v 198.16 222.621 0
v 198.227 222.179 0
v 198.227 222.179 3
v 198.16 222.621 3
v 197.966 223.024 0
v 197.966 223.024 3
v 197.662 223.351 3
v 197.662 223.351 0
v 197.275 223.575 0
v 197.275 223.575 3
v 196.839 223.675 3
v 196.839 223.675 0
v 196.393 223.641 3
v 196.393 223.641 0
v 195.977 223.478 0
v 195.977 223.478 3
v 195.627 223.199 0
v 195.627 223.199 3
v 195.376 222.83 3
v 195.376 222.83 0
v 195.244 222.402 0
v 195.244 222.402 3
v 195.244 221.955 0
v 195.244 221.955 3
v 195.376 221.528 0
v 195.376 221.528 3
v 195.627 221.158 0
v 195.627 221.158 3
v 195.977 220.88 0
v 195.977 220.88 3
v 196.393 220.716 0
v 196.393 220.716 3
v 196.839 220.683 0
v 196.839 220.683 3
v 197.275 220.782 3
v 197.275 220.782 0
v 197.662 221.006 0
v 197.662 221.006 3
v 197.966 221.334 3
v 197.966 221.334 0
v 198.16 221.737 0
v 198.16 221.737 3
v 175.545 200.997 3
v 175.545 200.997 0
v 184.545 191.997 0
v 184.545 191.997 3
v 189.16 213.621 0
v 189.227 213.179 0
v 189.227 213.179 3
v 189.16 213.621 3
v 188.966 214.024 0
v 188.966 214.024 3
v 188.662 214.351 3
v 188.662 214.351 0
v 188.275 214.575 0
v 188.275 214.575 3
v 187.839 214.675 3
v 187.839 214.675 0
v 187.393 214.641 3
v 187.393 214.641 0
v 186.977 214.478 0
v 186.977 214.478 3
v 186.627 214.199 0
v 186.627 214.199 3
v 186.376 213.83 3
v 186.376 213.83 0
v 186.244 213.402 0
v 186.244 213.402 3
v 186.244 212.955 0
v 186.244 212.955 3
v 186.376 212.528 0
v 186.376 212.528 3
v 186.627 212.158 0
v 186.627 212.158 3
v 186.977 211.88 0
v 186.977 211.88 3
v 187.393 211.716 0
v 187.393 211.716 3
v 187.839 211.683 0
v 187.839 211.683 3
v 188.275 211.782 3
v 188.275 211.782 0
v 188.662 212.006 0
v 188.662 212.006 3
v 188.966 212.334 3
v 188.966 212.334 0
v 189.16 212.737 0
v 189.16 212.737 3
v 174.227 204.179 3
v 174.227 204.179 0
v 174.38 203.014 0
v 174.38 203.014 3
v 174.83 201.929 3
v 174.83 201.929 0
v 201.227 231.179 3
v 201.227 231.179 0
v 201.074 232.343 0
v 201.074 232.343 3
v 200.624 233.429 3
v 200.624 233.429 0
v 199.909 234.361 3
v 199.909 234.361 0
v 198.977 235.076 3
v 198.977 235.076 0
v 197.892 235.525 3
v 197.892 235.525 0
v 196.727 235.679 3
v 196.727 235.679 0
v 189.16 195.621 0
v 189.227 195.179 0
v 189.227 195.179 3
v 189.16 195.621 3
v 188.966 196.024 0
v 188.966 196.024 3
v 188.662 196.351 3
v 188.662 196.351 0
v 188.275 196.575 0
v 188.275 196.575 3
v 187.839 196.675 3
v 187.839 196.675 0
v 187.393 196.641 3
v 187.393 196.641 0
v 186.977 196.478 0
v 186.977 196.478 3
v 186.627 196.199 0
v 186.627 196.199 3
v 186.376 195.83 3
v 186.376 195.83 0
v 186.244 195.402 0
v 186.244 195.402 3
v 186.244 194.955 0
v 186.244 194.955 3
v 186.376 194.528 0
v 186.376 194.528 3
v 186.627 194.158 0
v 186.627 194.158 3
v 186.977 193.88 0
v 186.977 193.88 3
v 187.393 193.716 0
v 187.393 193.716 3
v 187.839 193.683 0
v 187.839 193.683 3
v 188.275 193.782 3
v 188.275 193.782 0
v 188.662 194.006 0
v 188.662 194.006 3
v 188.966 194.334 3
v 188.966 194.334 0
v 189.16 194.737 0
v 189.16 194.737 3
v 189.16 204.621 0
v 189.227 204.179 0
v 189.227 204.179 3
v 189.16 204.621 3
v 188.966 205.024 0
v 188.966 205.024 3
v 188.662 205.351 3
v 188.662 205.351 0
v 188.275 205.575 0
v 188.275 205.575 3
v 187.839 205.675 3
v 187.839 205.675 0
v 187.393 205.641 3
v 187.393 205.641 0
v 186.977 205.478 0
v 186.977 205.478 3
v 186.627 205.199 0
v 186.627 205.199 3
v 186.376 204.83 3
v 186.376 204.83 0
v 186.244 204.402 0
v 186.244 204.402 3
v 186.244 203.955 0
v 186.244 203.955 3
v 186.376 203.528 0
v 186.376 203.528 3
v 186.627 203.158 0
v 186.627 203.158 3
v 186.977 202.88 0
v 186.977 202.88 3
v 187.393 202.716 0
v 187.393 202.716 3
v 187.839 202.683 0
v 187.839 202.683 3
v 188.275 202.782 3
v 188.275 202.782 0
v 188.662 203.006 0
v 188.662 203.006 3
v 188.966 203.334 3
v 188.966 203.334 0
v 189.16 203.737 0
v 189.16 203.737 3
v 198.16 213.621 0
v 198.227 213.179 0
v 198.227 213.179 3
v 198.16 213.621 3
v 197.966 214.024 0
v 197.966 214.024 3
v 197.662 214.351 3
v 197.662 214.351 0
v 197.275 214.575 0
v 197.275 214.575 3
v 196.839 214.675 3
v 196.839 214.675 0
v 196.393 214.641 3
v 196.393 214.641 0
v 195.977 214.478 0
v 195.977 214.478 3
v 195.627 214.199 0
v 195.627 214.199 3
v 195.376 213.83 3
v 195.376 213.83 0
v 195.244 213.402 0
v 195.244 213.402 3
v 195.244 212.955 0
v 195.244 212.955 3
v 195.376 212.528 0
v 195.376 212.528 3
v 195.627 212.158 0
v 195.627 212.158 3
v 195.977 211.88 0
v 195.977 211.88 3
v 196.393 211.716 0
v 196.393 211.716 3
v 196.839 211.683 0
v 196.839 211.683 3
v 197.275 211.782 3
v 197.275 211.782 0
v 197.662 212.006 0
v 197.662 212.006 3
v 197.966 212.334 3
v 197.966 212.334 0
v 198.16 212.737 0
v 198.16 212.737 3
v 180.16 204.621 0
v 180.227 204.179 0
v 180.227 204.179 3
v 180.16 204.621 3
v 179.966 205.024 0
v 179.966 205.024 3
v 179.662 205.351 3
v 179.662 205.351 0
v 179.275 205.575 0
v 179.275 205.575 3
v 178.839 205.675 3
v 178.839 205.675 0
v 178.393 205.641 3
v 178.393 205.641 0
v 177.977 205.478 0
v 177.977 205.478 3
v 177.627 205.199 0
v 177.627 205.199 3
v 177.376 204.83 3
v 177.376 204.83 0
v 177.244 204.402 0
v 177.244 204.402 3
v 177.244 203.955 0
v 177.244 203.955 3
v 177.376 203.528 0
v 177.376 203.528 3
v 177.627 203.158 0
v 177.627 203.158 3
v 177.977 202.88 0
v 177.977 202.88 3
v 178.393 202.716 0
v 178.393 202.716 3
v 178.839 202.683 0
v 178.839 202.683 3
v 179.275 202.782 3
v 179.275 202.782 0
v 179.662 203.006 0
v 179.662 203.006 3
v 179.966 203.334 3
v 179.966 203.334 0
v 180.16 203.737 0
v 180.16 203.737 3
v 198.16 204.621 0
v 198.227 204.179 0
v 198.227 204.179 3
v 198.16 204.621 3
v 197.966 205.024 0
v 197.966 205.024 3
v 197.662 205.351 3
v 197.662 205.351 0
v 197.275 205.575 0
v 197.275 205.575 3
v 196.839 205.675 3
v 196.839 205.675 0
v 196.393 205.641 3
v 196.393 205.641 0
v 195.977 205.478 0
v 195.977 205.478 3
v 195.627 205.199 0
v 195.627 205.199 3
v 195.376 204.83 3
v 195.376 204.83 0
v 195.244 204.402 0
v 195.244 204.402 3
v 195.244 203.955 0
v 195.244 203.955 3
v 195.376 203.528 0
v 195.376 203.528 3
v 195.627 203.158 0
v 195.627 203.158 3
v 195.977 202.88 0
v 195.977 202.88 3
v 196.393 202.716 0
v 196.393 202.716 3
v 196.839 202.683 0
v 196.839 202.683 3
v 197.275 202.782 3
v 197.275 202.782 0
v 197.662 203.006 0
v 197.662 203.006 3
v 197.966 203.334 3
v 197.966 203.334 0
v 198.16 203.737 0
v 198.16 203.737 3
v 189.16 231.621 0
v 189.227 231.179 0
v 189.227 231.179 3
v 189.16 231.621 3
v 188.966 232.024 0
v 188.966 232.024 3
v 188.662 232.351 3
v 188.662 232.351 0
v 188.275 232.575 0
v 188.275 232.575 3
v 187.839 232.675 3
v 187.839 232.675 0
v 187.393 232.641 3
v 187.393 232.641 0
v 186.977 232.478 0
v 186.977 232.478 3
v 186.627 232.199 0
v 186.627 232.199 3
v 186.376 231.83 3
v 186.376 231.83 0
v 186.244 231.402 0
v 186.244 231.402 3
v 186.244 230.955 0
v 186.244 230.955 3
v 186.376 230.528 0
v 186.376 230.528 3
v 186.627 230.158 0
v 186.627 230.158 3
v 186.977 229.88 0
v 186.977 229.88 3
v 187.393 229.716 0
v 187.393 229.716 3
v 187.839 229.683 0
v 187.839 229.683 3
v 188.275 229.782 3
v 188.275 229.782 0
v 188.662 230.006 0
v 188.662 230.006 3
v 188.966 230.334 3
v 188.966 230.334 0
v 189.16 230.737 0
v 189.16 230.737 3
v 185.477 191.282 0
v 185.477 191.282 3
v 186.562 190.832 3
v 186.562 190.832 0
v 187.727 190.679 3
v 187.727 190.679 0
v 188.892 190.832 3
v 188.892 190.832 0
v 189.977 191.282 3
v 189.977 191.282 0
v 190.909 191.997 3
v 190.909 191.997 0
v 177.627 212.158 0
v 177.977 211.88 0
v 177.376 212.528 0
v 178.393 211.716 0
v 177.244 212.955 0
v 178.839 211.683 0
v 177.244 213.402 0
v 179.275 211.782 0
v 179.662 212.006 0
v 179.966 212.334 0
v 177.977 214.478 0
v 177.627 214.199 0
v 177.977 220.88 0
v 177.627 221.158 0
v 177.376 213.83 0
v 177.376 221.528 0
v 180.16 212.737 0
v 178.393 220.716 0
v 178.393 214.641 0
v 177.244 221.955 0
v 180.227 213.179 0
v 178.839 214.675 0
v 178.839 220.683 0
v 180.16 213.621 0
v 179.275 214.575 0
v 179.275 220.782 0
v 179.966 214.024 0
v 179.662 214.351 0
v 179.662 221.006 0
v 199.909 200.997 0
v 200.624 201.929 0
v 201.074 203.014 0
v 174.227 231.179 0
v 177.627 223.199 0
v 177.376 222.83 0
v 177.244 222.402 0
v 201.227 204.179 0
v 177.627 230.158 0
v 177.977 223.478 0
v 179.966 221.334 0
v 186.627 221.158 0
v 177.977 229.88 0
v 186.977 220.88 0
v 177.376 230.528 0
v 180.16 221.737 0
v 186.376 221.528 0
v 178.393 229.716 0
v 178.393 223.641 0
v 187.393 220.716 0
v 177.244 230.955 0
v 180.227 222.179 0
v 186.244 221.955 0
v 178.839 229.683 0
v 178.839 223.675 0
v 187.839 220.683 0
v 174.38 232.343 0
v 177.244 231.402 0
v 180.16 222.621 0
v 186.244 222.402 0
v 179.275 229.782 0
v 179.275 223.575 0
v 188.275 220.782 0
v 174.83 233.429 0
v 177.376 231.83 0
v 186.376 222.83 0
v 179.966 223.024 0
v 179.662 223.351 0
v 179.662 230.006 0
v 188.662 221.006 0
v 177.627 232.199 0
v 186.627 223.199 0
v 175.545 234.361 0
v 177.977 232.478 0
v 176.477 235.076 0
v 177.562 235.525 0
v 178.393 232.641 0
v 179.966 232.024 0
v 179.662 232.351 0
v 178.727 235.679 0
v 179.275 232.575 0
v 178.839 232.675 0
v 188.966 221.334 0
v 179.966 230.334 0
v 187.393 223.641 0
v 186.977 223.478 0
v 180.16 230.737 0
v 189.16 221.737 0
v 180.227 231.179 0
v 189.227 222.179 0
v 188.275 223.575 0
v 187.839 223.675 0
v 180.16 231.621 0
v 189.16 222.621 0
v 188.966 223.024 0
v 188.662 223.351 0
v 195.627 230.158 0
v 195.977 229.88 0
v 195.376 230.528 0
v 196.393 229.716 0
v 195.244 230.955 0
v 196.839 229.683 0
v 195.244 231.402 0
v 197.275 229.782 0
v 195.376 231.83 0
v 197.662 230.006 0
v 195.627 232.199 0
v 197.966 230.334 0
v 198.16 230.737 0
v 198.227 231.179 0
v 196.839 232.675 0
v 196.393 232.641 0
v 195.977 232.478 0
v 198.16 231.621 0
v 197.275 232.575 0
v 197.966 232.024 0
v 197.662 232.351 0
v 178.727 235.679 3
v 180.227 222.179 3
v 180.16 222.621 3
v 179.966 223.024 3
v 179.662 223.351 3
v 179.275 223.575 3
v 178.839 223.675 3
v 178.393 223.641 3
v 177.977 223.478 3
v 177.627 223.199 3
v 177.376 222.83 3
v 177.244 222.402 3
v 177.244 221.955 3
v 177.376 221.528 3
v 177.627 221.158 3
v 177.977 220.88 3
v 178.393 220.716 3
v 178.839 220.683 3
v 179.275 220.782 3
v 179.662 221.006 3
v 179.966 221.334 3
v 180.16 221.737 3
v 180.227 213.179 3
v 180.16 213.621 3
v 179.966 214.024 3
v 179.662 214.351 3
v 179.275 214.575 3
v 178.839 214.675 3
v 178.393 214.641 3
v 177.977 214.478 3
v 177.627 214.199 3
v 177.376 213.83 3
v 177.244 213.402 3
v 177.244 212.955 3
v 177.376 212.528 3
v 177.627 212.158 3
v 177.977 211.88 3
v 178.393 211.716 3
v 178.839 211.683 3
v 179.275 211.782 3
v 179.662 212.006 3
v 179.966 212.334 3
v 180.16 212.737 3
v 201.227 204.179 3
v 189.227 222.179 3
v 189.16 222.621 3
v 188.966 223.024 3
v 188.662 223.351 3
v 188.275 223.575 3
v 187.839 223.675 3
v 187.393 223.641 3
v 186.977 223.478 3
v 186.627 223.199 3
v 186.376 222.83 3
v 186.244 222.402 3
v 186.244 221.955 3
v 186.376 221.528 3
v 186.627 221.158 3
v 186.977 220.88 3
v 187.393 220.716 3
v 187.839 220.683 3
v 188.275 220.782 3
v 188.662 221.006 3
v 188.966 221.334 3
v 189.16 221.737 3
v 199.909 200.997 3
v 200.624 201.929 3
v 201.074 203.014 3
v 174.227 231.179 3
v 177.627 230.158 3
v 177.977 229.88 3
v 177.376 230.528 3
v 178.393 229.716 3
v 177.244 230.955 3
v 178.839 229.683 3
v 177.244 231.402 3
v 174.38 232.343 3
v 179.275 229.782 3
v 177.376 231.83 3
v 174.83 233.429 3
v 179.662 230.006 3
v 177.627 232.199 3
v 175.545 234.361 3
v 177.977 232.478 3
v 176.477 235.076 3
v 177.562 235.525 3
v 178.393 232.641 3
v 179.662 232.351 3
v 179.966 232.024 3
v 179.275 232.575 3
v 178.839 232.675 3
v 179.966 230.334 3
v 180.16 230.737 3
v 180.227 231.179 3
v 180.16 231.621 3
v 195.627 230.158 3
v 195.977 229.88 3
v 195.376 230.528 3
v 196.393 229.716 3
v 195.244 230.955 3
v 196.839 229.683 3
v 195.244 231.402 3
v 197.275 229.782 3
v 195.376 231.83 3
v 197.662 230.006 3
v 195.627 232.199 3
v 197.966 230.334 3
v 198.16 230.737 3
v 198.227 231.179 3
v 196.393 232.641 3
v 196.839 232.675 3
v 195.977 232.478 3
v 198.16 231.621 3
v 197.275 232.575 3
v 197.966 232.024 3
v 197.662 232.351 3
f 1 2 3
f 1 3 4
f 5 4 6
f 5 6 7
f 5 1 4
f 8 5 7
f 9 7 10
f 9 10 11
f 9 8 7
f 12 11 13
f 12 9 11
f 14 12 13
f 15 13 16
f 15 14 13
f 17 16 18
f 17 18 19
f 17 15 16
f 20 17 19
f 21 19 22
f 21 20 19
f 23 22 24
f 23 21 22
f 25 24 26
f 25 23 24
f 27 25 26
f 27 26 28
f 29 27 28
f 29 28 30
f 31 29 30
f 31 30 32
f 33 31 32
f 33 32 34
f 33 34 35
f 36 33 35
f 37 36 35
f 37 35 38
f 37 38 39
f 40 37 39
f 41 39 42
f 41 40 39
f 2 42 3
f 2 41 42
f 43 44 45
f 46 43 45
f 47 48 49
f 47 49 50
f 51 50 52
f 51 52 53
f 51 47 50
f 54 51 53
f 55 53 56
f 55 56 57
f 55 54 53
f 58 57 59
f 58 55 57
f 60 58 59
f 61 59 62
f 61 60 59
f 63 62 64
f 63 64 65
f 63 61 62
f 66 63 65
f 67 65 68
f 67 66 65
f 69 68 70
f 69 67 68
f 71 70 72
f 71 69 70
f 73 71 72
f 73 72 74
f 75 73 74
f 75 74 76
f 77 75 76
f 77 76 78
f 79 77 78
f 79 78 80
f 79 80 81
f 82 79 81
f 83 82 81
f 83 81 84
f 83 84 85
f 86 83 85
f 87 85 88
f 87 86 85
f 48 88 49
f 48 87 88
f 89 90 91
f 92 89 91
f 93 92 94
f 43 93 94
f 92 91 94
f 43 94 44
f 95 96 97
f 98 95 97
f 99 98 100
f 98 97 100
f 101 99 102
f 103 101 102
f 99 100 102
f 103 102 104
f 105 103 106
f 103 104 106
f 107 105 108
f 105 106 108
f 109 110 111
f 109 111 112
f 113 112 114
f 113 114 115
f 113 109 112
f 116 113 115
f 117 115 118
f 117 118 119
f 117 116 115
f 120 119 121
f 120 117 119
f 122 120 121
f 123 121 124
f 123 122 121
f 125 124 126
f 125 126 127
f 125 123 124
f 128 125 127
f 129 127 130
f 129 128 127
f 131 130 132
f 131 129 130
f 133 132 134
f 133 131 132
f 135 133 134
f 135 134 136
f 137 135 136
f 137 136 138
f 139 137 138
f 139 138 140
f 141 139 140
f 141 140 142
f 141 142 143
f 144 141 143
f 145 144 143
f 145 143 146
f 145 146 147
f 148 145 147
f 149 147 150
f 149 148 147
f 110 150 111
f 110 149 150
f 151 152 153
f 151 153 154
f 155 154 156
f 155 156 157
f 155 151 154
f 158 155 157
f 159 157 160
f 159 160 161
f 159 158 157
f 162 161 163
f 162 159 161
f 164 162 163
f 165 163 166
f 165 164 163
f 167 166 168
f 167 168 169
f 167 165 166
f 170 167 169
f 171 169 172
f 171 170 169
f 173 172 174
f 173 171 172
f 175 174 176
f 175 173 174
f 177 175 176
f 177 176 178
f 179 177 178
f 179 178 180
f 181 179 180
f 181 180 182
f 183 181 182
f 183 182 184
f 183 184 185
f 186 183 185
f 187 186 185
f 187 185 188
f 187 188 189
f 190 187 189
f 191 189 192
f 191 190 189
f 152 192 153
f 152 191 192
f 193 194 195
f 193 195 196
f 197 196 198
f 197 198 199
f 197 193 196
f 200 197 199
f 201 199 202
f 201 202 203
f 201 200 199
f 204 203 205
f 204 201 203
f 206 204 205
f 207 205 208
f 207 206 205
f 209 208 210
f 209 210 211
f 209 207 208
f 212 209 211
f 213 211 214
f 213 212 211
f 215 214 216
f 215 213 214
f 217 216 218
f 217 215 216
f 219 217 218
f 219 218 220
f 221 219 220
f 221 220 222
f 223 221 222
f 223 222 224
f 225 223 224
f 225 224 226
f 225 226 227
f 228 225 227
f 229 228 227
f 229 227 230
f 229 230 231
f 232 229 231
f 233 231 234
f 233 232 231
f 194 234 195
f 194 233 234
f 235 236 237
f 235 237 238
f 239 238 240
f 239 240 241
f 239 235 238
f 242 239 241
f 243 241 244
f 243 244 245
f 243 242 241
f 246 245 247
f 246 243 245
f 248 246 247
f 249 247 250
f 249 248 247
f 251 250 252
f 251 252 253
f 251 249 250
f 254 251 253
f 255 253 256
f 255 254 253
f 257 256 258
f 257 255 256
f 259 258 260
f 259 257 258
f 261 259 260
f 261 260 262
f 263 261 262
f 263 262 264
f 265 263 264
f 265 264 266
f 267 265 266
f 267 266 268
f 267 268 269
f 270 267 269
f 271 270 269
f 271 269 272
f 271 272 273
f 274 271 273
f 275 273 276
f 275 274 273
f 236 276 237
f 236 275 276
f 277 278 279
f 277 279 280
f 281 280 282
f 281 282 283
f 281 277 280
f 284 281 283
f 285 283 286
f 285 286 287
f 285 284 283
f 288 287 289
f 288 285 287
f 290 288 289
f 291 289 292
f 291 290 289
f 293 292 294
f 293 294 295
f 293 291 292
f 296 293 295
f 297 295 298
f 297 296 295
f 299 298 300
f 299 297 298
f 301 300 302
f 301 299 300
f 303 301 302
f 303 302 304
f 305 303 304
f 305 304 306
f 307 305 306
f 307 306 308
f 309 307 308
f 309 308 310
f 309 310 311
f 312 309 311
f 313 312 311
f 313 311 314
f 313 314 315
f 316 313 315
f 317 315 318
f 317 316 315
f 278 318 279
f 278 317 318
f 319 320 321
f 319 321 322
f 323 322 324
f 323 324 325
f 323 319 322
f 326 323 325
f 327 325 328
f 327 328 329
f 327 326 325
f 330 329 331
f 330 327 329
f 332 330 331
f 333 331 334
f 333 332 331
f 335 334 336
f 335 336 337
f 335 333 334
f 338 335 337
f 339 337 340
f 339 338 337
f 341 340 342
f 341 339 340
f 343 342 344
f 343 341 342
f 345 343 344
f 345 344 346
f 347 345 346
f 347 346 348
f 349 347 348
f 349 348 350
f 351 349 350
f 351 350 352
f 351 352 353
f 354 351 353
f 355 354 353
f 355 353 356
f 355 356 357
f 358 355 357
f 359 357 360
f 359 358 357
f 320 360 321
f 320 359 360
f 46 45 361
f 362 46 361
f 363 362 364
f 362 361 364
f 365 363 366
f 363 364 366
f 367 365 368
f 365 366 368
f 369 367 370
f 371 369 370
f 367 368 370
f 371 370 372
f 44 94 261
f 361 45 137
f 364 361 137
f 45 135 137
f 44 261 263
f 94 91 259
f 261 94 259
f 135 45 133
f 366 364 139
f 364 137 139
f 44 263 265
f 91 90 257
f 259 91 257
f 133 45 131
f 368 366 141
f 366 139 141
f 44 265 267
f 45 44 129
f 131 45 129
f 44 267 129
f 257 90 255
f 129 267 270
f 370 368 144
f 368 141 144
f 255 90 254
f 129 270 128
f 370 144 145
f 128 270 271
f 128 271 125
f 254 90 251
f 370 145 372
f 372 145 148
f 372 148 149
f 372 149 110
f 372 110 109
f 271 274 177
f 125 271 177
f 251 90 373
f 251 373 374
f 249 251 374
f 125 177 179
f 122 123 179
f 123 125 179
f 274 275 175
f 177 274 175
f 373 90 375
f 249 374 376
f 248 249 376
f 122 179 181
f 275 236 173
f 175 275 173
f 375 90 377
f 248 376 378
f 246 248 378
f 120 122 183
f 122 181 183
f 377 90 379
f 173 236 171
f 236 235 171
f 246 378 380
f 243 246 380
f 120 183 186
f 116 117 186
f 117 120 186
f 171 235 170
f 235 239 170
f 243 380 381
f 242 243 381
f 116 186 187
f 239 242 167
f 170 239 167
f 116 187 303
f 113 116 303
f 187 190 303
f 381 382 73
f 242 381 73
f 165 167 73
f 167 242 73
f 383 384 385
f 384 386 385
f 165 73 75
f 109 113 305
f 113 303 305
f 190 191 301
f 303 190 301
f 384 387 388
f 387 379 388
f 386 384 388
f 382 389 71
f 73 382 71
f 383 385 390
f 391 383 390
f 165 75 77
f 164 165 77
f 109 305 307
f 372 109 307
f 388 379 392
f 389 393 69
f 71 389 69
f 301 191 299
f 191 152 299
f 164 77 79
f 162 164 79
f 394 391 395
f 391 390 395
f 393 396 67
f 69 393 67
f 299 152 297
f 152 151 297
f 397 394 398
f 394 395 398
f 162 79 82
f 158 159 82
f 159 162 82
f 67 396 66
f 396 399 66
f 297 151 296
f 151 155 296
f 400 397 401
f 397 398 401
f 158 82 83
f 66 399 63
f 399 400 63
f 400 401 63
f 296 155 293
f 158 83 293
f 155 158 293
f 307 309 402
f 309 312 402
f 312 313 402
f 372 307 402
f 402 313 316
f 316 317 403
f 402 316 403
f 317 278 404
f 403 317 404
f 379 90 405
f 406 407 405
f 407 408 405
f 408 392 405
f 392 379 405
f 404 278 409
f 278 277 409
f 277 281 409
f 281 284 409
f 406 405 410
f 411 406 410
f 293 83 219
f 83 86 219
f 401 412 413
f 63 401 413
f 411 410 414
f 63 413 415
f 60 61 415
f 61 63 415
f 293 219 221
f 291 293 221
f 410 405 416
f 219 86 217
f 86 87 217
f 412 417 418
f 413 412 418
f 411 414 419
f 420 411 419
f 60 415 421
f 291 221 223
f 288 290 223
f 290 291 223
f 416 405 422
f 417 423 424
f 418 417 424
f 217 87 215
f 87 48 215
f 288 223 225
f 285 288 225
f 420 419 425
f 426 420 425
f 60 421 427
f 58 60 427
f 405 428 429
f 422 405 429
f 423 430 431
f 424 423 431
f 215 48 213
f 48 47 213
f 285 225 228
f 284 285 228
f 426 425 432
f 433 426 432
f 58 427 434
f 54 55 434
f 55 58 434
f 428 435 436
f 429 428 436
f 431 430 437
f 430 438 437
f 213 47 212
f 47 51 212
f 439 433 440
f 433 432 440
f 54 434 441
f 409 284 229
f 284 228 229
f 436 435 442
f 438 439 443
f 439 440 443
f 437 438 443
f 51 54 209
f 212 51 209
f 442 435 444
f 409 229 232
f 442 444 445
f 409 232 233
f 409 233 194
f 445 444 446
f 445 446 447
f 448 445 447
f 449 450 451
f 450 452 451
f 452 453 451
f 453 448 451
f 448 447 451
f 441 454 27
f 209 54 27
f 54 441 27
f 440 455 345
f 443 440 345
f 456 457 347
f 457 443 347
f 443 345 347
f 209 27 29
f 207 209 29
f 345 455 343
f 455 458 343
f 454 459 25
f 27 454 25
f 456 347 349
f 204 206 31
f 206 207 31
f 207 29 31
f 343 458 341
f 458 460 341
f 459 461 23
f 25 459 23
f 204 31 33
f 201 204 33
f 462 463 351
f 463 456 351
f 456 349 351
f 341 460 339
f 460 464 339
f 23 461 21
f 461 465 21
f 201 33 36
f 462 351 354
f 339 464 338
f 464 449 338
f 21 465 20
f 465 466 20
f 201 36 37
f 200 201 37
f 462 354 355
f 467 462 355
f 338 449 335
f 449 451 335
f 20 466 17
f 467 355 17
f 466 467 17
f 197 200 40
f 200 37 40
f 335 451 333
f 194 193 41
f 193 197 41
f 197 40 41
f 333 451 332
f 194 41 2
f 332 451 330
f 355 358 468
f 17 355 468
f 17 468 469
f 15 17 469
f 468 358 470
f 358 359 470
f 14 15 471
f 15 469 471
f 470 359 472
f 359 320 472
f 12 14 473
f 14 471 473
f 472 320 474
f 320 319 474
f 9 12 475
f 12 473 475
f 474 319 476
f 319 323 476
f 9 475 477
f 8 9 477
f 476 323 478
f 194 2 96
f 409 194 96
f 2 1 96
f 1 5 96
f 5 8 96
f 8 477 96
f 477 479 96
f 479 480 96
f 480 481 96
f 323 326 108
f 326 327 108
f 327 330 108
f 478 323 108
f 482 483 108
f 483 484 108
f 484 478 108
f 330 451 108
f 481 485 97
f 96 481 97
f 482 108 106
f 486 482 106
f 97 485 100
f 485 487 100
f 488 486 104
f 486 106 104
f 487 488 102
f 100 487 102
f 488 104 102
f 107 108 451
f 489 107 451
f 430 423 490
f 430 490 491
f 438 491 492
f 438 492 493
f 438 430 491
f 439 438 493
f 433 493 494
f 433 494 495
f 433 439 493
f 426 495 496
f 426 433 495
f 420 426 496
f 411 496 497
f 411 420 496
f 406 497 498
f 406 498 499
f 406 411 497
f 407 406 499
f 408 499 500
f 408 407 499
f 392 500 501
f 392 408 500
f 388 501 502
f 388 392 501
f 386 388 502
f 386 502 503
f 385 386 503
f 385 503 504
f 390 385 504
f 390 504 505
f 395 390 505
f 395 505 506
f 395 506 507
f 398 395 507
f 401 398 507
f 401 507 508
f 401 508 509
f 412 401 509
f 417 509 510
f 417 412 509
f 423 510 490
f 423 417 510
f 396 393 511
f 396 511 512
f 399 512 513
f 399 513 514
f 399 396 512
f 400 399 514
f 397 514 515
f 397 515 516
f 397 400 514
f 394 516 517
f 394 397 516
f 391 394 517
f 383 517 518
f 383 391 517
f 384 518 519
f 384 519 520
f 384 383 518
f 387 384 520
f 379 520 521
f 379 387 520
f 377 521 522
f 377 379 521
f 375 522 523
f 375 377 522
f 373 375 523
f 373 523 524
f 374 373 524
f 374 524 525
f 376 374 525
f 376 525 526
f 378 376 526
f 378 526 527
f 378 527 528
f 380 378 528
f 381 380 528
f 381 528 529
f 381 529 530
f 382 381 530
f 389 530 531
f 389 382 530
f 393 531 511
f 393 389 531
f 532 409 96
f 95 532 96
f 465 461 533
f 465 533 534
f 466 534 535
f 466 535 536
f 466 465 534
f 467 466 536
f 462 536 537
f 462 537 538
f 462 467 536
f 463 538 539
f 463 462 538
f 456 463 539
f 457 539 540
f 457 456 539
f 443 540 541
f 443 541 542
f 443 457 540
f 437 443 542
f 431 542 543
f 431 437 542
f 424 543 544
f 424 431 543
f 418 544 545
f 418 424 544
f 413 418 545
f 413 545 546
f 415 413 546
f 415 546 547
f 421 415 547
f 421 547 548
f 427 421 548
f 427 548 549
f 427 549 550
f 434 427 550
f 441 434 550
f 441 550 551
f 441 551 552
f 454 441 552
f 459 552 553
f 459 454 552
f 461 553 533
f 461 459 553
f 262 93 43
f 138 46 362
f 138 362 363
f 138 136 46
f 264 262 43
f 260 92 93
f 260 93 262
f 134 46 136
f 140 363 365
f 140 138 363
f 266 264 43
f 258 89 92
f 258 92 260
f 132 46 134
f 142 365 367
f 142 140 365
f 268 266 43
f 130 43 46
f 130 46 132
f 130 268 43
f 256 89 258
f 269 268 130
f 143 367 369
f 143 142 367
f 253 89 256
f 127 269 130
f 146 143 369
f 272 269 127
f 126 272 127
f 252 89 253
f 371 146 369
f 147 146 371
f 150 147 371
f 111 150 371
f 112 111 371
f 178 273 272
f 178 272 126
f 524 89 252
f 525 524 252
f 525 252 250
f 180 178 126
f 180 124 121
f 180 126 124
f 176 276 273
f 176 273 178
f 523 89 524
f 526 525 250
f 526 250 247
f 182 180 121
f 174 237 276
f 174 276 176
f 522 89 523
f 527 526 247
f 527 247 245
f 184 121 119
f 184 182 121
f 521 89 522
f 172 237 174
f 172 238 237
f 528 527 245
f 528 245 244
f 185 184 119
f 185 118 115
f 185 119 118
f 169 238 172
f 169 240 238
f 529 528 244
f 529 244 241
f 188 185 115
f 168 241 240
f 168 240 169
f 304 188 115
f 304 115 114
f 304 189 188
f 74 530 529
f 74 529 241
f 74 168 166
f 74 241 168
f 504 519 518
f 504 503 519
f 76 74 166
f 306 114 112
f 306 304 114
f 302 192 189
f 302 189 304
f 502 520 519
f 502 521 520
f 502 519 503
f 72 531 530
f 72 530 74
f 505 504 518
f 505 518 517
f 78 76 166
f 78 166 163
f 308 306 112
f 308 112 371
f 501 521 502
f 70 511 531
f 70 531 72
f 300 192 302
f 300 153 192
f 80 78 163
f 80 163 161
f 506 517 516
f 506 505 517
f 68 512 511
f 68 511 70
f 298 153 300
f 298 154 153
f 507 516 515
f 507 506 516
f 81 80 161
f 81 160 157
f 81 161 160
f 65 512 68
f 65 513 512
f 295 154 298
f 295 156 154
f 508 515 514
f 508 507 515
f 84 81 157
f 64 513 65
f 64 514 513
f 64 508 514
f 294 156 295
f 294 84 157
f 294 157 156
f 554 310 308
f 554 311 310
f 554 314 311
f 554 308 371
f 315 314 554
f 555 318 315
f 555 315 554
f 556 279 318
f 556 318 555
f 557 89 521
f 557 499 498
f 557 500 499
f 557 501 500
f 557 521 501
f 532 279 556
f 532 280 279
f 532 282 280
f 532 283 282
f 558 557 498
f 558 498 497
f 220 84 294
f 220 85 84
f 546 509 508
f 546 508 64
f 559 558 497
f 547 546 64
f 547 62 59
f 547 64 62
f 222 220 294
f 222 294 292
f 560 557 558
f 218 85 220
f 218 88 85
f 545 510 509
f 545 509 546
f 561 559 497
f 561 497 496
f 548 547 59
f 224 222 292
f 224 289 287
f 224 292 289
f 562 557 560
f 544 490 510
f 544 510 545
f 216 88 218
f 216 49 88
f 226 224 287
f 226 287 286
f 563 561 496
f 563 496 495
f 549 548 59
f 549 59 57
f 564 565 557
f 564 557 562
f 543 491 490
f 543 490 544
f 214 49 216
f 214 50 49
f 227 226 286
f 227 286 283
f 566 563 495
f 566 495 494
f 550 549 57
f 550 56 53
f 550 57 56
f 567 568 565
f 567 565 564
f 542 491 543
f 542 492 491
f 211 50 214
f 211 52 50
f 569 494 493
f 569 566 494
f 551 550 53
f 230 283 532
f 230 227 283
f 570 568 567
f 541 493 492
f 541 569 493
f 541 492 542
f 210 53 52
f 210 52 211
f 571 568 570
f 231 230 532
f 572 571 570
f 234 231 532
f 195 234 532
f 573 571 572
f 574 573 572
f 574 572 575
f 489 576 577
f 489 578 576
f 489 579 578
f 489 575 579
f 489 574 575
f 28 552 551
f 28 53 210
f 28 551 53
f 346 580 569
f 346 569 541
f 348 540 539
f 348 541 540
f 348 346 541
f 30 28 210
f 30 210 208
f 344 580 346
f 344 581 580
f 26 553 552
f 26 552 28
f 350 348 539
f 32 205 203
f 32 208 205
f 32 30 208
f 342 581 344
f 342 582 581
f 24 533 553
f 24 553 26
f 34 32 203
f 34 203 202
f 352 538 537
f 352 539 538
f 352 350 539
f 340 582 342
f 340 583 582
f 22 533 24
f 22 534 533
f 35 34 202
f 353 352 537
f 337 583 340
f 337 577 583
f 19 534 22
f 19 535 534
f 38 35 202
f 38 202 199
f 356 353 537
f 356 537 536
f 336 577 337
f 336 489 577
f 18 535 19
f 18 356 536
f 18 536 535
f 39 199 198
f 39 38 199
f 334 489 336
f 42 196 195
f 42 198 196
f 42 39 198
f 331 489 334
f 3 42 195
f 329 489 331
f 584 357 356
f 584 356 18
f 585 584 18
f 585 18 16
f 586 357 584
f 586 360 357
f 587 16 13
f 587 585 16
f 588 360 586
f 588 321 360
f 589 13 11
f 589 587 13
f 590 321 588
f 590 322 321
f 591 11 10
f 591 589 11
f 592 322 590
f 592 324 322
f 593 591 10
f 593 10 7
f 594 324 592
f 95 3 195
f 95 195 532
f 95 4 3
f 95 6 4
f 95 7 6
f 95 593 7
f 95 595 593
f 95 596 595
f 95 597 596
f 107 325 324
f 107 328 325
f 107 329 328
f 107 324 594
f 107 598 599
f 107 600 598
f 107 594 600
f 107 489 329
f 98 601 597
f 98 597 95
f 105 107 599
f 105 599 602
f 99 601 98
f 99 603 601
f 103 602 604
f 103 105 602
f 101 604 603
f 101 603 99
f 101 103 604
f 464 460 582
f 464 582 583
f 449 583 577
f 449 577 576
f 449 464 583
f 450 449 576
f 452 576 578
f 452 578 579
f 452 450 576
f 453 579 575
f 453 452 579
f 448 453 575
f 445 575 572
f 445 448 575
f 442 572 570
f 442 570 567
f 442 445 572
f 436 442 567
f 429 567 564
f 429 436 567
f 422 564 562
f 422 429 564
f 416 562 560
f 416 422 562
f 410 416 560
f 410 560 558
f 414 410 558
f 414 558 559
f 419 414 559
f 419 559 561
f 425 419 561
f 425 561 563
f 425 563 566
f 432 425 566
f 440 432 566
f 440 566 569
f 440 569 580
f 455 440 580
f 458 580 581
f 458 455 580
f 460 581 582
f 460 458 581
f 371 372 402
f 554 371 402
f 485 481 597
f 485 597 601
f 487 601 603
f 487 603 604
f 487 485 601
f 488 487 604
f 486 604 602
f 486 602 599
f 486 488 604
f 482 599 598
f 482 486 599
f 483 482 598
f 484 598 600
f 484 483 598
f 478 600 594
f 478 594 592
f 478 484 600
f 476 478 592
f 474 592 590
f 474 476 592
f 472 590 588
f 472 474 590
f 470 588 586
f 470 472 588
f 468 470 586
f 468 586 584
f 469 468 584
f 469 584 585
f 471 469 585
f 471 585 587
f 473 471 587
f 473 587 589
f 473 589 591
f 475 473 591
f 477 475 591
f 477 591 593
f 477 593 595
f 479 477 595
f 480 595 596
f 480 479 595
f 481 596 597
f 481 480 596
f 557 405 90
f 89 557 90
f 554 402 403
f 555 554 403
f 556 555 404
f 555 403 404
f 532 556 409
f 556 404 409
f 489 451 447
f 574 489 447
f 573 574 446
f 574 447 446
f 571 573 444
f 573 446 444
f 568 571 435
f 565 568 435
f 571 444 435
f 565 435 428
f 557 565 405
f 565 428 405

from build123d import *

# Parameters (mm, degrees)
MODEL_R                 = 1.5
SALIENTE_EXTRUIR1_DEPTH = 3


with BuildPart() as part:
    # Model → Saliente-Extruir1 (new body)
    with BuildSketch(Plane.XY):
        with BuildLine():
            Line((174.227054575, 213.178720063), (174.227054575, 204.178720063))
            ThreePointArc((174.227054575, 204.178720063), (174.569596678, 202.456644617), (175.545074059, 200.996739548))
            Line((175.545074059, 200.996739548), (184.545074059, 191.996739548))
            ThreePointArc((184.545074059, 191.996739548), (187.727054575, 190.678720063), (190.90903509, 191.996739548))
            Line((190.90903509, 191.996739548), (199.90903509, 200.996739548))
            ThreePointArc((199.90903509, 200.996739548), (200.884512471, 202.456644617), (201.227054575, 204.178720063))
            Line((201.227054575, 204.178720063), (201.227054575, 231.178720063))
            ThreePointArc((201.227054575, 231.178720063), (199.90903509, 234.360700578), (196.727054575, 235.678720063))
            Line((196.727054575, 235.678720063), (178.727054575, 235.678720063))
            ThreePointArc((178.727054575, 235.678720063), (175.545074059, 234.360700578), (174.227054575, 231.178720063))
            Line((174.227054575, 231.178720063), (174.227054575, 213.178720063))
        make_face()
        with Locations((187.727054575, 204.178720063)):
            Circle(MODEL_R, mode=Mode.SUBTRACT)
        with Locations((178.727054575, 204.178720063)):
            Circle(MODEL_R, mode=Mode.SUBTRACT)
        with Locations((187.727054575, 213.178720063)):
            Circle(MODEL_R, mode=Mode.SUBTRACT)
        with Locations((178.727054575, 213.178720063)):
            Circle(MODEL_R, mode=Mode.SUBTRACT)
        with Locations((196.727054575, 213.178720063)):
            Circle(MODEL_R, mode=Mode.SUBTRACT)
        with Locations((187.727054575, 195.178720063)):
            Circle(MODEL_R, mode=Mode.SUBTRACT)
        with Locations((196.727054575, 204.178720063)):
            Circle(MODEL_R, mode=Mode.SUBTRACT)
        with Locations((187.727054575, 222.178720063)):
            Circle(MODEL_R, mode=Mode.SUBTRACT)
        with Locations((178.727054575, 222.178720063)):
            Circle(MODEL_R, mode=Mode.SUBTRACT)
        with Locations((196.727054575, 222.178720063)):
            Circle(MODEL_R, mode=Mode.SUBTRACT)
        with Locations((187.727054575, 231.178720063)):
            Circle(MODEL_R, mode=Mode.SUBTRACT)
        with Locations((178.727054575, 231.178720063)):
            Circle(MODEL_R, mode=Mode.SUBTRACT)
        with Locations((196.727054575, 231.178720063)):
            Circle(MODEL_R, mode=Mode.SUBTRACT)
    extrude(amount=SALIENTE_EXTRUIR1_DEPTH)


solid = part.part
